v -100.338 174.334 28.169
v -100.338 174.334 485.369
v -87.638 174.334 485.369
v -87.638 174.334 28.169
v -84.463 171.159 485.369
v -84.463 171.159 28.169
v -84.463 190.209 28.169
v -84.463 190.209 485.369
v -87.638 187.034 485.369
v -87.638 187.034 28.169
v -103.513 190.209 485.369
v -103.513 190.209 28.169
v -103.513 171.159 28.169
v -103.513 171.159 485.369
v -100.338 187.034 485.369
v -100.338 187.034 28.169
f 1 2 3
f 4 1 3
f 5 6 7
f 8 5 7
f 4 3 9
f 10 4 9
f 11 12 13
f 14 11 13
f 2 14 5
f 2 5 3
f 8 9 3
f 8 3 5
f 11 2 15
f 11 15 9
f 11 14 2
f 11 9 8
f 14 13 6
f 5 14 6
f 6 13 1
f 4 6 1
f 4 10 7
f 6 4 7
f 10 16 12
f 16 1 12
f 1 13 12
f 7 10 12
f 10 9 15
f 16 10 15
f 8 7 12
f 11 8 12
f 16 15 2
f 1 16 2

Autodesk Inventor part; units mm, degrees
ref_plane "YZ Plane" through (0, 0, 0) normal (1, 0, 0) x (0, 1, 0)
ref_plane "XZ Plane" through (0, 0, 0) normal (0, 1, 0) x (-1, 0, 0)
ref_plane "XY Plane" through (0, 0, 0) normal (0, 0, 1) x (1, 0, 0)
ref_plane "Work Plane1" through (-350.1142, 119.2278, 28.1686) normal (0, 0, 1) x (0, 1, 0)
sketch "Sketch1" plane through (-350.1142, 119.2278, 28.1686) normal (0, 0, 1) x (0, 1, 0)
  line L0 (70.9812, -246.6013) -> (51.9312, -246.6013)
  line L1 (51.9312, -246.6013) -> (51.9312, -265.6513)
  line L2 (51.9312, -265.6513) -> (70.9812, -265.6513)
  line L3 (70.9812, -265.6513) -> (70.9812, -246.6013)
  line L4 (67.8062, -249.7763) -> (55.1062, -249.7763)
  line L5 (55.1062, -249.7763) -> (55.1062, -262.4763)
  line L6 (55.1062, -262.4763) -> (67.8062, -262.4763)
  line L7 (67.8062, -262.4763) -> (67.8062, -249.7763)
  point P0 (-119.2278, -350.1142)
  dimension "d0" = 19.05
  dimension "d1" = 19.05
  dimension "d2" = 3.175
extrude "Extrusion1" add sketch "Sketch1" along normal blind 457.2
properties part number "StaticForks"
